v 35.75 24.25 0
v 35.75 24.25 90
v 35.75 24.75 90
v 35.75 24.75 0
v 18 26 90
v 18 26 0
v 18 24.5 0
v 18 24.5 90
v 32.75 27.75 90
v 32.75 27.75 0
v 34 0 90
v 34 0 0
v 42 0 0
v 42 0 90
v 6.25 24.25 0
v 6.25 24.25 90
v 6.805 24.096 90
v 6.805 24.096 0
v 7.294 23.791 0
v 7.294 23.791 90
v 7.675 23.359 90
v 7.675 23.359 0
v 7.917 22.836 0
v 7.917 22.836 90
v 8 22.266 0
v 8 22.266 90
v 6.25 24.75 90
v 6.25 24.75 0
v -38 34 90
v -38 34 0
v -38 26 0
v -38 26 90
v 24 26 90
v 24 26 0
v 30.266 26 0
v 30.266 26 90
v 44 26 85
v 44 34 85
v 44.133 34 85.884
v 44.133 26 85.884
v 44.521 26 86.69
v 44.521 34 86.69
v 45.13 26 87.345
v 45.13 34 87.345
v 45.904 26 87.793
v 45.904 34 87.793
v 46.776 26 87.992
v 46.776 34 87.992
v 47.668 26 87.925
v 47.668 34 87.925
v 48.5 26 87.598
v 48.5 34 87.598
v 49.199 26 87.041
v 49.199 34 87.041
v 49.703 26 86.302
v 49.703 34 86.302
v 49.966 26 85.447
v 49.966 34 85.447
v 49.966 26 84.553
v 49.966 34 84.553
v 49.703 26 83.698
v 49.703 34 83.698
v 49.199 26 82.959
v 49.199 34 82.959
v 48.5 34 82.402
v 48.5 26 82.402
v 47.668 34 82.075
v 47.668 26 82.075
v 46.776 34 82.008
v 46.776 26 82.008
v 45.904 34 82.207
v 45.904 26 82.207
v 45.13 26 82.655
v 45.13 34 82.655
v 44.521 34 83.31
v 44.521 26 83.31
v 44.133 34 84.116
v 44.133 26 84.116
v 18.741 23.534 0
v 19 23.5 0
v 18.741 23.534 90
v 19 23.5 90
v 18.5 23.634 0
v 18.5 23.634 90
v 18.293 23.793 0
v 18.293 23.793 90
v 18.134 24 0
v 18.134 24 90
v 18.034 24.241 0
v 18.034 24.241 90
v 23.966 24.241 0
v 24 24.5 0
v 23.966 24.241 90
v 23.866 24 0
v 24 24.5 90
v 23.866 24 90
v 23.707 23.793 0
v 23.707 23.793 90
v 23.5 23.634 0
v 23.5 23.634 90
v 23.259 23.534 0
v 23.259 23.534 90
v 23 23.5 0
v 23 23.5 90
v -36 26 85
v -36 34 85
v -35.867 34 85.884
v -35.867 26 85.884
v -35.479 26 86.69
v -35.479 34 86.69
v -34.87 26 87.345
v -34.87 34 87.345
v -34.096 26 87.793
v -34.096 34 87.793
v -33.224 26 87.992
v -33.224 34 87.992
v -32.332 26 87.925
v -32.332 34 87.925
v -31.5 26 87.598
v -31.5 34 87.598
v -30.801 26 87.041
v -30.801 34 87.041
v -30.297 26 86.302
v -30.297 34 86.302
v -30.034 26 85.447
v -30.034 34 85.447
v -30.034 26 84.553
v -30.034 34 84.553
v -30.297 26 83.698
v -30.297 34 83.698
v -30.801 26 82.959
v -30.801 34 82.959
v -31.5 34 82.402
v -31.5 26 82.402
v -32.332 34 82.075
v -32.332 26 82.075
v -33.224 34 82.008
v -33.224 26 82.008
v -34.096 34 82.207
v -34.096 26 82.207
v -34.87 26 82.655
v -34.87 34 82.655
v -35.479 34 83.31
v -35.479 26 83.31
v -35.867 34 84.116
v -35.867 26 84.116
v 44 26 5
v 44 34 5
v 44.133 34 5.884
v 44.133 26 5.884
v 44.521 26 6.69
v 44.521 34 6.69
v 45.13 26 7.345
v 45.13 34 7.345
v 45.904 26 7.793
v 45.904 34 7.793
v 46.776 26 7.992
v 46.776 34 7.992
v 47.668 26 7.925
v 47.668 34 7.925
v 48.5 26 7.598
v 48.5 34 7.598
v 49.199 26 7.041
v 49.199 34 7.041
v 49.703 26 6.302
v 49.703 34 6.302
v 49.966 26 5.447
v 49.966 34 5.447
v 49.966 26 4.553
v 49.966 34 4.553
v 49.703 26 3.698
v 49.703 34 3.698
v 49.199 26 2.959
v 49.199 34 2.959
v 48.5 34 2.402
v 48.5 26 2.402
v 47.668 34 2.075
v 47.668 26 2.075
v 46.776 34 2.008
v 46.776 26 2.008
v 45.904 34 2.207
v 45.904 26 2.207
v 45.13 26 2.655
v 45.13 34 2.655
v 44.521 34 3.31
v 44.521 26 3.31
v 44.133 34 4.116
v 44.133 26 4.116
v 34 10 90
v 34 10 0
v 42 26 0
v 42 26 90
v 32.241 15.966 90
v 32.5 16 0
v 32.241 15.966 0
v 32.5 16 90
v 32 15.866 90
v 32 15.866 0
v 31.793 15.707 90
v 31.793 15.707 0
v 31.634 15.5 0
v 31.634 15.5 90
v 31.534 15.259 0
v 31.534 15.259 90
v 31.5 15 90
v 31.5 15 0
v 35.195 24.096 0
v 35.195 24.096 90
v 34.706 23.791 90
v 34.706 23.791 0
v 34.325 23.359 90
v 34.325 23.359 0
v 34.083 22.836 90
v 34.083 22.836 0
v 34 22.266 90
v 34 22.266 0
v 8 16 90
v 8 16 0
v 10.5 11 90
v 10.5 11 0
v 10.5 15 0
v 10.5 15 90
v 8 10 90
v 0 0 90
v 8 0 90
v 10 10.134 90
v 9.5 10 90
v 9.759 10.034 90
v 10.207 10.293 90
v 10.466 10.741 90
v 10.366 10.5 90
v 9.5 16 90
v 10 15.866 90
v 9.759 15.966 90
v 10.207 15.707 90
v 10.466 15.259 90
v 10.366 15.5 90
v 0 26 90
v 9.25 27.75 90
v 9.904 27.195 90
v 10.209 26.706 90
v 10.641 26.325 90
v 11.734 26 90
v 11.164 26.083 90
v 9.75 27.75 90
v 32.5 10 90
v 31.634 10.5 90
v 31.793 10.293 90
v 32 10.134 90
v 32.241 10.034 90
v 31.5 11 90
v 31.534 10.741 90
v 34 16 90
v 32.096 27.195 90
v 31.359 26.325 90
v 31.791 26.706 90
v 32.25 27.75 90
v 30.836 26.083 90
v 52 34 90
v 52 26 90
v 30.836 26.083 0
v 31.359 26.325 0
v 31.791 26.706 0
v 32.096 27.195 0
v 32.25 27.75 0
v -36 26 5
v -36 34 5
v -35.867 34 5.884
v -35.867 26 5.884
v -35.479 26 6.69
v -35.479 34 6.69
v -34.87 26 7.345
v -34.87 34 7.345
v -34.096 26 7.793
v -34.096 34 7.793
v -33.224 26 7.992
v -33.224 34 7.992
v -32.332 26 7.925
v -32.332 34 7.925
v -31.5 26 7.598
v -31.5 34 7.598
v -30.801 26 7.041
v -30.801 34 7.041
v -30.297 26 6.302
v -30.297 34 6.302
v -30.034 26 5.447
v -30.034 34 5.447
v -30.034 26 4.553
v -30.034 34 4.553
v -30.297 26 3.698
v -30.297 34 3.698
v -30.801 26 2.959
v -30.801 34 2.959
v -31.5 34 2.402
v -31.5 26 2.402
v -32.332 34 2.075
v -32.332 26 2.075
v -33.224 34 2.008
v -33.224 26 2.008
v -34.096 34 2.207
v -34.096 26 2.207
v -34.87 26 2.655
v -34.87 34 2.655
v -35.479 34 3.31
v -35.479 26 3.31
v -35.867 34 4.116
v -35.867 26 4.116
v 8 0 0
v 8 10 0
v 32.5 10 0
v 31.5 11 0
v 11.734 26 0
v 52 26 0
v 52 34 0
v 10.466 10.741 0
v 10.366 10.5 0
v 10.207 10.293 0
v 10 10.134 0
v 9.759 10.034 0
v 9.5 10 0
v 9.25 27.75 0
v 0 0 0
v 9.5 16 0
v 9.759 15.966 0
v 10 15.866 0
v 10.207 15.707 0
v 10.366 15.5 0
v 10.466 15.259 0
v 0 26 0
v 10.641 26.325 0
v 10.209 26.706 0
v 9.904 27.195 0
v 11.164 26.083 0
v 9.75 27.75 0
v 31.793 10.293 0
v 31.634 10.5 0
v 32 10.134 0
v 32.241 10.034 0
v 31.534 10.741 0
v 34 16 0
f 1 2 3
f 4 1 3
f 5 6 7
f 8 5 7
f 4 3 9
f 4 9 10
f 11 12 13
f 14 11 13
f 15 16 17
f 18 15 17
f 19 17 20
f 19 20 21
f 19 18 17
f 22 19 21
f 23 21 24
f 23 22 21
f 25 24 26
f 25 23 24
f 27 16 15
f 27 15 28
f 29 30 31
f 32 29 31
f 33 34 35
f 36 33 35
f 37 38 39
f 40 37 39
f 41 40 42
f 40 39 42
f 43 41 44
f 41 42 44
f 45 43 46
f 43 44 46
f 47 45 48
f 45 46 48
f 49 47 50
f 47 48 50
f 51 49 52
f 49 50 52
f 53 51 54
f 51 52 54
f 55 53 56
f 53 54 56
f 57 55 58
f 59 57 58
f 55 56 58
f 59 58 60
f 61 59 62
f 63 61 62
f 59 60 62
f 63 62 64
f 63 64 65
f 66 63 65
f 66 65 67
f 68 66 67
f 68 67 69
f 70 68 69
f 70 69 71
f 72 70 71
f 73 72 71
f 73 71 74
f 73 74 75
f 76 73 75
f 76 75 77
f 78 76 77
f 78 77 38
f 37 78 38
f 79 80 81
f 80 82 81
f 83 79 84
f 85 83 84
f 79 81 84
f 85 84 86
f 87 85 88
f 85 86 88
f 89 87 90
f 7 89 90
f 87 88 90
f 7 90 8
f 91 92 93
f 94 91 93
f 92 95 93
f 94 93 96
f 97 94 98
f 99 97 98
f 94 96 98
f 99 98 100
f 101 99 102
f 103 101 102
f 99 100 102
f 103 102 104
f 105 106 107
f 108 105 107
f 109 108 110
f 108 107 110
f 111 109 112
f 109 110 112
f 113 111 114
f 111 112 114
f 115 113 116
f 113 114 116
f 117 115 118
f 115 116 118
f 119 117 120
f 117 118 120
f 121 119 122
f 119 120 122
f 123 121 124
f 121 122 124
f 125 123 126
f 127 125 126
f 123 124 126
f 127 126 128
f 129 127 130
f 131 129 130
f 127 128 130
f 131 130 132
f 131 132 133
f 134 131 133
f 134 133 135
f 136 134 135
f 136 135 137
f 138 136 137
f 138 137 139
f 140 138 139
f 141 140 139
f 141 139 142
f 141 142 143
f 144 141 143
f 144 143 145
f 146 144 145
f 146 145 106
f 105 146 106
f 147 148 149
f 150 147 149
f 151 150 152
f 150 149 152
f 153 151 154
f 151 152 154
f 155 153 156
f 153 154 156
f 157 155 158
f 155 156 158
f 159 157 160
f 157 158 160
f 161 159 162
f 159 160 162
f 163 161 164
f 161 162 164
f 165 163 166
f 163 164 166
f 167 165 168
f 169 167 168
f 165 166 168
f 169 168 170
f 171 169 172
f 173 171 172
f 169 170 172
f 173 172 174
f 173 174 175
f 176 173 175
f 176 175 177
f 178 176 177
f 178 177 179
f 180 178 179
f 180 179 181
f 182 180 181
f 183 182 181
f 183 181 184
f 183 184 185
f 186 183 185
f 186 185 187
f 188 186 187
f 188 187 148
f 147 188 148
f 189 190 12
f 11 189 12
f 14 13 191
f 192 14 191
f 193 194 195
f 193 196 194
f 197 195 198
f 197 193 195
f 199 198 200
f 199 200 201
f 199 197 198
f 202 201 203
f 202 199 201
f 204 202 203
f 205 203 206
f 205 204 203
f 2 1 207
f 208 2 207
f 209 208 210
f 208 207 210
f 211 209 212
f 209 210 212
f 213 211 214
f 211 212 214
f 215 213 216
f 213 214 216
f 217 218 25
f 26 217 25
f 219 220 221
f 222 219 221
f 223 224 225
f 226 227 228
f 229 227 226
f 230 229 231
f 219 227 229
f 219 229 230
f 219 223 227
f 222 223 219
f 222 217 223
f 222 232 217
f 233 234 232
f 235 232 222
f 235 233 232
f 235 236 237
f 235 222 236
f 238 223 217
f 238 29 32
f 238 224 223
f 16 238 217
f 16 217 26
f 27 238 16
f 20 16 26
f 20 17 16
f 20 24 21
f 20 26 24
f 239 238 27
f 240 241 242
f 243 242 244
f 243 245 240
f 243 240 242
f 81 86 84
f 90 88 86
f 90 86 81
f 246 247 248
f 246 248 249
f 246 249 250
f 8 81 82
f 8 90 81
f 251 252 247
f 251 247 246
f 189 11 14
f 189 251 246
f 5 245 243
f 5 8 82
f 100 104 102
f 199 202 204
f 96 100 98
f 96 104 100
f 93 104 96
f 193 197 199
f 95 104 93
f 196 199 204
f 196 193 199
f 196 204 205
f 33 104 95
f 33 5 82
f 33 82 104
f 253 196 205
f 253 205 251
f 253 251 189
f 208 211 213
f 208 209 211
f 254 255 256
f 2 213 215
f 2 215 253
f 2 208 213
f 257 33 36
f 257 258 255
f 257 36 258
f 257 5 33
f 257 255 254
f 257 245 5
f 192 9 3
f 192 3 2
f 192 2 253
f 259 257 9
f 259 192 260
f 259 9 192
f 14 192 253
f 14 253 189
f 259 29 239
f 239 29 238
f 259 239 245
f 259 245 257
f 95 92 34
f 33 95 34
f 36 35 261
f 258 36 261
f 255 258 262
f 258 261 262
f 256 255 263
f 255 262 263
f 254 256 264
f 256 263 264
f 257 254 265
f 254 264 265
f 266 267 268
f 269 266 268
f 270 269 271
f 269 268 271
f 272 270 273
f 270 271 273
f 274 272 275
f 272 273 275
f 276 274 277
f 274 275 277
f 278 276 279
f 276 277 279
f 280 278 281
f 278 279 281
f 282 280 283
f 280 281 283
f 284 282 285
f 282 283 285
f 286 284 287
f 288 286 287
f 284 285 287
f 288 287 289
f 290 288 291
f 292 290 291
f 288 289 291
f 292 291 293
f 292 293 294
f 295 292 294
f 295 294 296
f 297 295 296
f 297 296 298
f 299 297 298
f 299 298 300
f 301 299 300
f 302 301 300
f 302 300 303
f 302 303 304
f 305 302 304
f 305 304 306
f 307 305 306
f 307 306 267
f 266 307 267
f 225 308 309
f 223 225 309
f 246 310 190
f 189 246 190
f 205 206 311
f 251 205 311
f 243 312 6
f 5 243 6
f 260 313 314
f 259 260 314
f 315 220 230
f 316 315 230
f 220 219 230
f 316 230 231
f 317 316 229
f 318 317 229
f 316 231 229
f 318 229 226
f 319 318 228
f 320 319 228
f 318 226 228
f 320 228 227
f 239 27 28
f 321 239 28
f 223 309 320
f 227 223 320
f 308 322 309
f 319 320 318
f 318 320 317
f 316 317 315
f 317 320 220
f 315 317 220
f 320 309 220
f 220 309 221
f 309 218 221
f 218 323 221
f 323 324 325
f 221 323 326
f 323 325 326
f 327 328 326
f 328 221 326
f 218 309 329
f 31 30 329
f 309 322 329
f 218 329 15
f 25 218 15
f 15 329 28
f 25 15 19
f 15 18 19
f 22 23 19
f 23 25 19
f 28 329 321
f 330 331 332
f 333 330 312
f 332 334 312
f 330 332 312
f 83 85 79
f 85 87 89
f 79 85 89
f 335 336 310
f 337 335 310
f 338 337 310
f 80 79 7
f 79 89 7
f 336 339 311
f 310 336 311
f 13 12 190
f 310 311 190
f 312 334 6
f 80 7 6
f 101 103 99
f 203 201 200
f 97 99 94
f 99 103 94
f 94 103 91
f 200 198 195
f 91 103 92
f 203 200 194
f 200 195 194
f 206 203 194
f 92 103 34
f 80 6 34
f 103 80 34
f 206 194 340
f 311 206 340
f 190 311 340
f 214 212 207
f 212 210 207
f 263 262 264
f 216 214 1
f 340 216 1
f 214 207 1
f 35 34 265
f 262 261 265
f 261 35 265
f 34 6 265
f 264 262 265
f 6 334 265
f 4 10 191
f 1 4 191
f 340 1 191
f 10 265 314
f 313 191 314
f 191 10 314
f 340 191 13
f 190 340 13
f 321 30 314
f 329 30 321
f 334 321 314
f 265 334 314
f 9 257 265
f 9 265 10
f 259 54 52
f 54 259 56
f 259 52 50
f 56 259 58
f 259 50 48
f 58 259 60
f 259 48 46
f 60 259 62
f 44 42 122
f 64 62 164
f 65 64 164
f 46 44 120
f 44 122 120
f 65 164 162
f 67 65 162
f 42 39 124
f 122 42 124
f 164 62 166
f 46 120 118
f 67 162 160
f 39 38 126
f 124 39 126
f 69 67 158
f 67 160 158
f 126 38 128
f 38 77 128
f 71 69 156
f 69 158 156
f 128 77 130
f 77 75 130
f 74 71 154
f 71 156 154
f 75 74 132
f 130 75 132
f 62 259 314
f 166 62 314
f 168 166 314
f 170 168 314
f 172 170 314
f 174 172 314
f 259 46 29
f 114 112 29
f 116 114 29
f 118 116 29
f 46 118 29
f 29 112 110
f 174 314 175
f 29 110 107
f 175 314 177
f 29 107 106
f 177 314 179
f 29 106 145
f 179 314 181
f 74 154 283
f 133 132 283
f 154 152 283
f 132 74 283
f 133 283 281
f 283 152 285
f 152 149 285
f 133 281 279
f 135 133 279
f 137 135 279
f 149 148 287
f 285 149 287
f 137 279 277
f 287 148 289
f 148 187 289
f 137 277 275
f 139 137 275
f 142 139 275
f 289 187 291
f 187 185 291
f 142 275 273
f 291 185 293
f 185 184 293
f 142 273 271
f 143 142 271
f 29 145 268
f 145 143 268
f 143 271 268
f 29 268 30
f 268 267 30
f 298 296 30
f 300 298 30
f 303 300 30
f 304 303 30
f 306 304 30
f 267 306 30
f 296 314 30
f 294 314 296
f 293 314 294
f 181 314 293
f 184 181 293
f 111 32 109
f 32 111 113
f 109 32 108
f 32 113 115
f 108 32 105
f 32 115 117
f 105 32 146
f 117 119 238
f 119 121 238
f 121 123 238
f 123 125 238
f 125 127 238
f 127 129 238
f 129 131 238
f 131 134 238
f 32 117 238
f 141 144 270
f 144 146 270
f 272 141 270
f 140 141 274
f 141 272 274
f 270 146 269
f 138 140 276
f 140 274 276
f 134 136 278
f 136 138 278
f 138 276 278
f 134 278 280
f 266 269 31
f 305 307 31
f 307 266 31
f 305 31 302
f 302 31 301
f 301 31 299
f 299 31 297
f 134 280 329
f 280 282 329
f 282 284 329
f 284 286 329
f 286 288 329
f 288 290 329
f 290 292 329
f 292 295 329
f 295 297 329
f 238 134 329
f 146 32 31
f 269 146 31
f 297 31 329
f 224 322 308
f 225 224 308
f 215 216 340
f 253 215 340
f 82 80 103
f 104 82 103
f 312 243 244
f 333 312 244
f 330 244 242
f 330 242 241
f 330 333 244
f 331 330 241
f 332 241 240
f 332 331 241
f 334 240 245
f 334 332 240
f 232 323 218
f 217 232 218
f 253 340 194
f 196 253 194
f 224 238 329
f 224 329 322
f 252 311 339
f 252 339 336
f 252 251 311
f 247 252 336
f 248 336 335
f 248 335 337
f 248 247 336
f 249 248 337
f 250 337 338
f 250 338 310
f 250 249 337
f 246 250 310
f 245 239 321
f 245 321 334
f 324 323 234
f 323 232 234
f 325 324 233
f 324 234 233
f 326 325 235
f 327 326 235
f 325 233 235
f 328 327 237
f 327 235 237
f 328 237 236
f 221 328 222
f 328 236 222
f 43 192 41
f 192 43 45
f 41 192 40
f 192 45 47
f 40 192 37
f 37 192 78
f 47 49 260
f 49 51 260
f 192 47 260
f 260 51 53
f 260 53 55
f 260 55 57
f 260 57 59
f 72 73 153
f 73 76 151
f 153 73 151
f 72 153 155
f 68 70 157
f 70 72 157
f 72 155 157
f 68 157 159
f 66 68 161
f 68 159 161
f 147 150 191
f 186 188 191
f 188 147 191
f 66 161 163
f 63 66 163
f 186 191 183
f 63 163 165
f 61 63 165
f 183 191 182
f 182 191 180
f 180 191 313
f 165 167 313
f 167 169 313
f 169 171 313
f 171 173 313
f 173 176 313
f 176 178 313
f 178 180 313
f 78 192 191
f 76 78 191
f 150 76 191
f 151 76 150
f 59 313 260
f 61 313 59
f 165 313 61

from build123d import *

# Parameters (mm, degrees)
F1_DEPTH     = 90
F2_R         = 3
F3_DEPTH     = 25
F4_W         = 3.5
F4_H         = 3.5
F5_DEPTH     = 300
F6_SIZE      = 3
F7_SIZE      = 3
F8_R         = 1
F9_T1_DEPTH  = 99.9215674165
F10_T1_DEPTH = 99.9215674165


# Not quite as in the source:
# - a fillet or chamfer that OpenCascade refuses, or shapes differently, is made with other operations: its cross-section is extruded or revolved along the edge and cut away or added


with BuildPart() as f1:
    # F0 (on Top) → F1 (new body)
    with BuildSketch(Plane.XY):
        Polygon((0, 26), (0, 0), (8, 0), (8, 10), (10.5, 10), (10.5, 16), (8, 16), (8, 26), (18, 26), (18, 23.5), (24, 23.5), (24, 26), (34, 26), (34, 16), (31.5, 16), (31.5, 10), (34, 10), (34, 0), (42, 0), (42, 26), (52, 26), (52, 34), (-38, 34), (-38, 26), align=None)
    extrude(amount=F1_DEPTH)

    # F2 (on face) → F3 (cut)
    with BuildSketch(Plane(origin=(0, 34, 0), x_dir=(-1, 0, 0), z_dir=(0, 1, 0))):
        with Locations((33, 85)):
            Circle(F2_R)
        with Locations((33, 5)):
            Circle(F2_R)
        with Locations((-47, 5)):
            Circle(F2_R)
        with Locations((-47, 85)):
            Circle(F2_R)
    extrude(amount=-F3_DEPTH, mode=Mode.SUBTRACT)

    # F4 (on face) → F5 (cut)
    with BuildSketch(Plane.XY.offset(90)):
        with Locations((8, 26)):
            Rectangle(F4_W, F4_H)
        with Locations((34, 26)):
            Rectangle(F4_W, F4_H)
    extrude(amount=-F5_DEPTH, mode=Mode.SUBTRACT)

    # F6
    f6_edges = [f1.edges().sort_by_distance(p)[0] for p in [
        (6.25, 27.75, 45),
    ]]
    chamfer(f6_edges, length=F6_SIZE)

    # F7
    f7_edges = [f1.edges().sort_by_distance(p)[0] for p in [
        (35.75, 27.75, 45),
    ]]
    chamfer(f7_edges, length=F7_SIZE)

    # F8
    f8_edges = [f1.edges().sort_by_distance(p)[0] for p in [
        (10.5, 10, 45),
        (10.5, 16, 45),
        (18, 23.5, 45),
        (24, 23.5, 45),
        (31.5, 10, 45),
        (31.5, 16, 45),
    ]]
    fillet(f8_edges, radius=F8_R)

    # F9: fillet of radius 2 on 2 edges, made by hand

    # F9_s2 → F9_t1 (cut)
    with BuildSketch(Plane.XY.offset(-4.9607837082)):
        with BuildLine():
            ThreePointArc((35.75, 24.25), (34.5, 23.5885621722), (34, 22.2656865167))
            Line((34, 22.2656865167), (34, 24.25))
            Line((34, 24.25), (35.75, 24.25))
        make_face()
        with BuildLine():
            ThreePointArc((30.2656865167, 26), (31.5885621722, 26.5), (32.25, 27.75))
            Line((32.25, 27.75), (32.25, 26))
            Line((32.25, 26), (30.2656865167, 26))
        make_face()
    extrude(amount=F9_T1_DEPTH, mode=Mode.SUBTRACT)

    # F10: fillet of radius 2 on 2 edges, made by hand

    # F10_s2 → F10_t1 (cut)
    with BuildSketch(Plane.XY.offset(-4.9607837082)):
        with BuildLine():
            ThreePointArc((11.7343134833, 26), (10.4114378278, 26.5), (9.75, 27.75))
            Line((9.75, 27.75), (9.75, 26))
            Line((9.75, 26), (11.7343134833, 26))
        make_face()
        with BuildLine():
            ThreePointArc((6.25, 24.25), (7.5, 23.5885621722), (8, 22.2656865167))
            Line((8, 22.2656865167), (8, 24.25))
            Line((8, 24.25), (6.25, 24.25))
        make_face()
    extrude(amount=F10_T1_DEPTH, mode=Mode.SUBTRACT)


solid = f1.part
